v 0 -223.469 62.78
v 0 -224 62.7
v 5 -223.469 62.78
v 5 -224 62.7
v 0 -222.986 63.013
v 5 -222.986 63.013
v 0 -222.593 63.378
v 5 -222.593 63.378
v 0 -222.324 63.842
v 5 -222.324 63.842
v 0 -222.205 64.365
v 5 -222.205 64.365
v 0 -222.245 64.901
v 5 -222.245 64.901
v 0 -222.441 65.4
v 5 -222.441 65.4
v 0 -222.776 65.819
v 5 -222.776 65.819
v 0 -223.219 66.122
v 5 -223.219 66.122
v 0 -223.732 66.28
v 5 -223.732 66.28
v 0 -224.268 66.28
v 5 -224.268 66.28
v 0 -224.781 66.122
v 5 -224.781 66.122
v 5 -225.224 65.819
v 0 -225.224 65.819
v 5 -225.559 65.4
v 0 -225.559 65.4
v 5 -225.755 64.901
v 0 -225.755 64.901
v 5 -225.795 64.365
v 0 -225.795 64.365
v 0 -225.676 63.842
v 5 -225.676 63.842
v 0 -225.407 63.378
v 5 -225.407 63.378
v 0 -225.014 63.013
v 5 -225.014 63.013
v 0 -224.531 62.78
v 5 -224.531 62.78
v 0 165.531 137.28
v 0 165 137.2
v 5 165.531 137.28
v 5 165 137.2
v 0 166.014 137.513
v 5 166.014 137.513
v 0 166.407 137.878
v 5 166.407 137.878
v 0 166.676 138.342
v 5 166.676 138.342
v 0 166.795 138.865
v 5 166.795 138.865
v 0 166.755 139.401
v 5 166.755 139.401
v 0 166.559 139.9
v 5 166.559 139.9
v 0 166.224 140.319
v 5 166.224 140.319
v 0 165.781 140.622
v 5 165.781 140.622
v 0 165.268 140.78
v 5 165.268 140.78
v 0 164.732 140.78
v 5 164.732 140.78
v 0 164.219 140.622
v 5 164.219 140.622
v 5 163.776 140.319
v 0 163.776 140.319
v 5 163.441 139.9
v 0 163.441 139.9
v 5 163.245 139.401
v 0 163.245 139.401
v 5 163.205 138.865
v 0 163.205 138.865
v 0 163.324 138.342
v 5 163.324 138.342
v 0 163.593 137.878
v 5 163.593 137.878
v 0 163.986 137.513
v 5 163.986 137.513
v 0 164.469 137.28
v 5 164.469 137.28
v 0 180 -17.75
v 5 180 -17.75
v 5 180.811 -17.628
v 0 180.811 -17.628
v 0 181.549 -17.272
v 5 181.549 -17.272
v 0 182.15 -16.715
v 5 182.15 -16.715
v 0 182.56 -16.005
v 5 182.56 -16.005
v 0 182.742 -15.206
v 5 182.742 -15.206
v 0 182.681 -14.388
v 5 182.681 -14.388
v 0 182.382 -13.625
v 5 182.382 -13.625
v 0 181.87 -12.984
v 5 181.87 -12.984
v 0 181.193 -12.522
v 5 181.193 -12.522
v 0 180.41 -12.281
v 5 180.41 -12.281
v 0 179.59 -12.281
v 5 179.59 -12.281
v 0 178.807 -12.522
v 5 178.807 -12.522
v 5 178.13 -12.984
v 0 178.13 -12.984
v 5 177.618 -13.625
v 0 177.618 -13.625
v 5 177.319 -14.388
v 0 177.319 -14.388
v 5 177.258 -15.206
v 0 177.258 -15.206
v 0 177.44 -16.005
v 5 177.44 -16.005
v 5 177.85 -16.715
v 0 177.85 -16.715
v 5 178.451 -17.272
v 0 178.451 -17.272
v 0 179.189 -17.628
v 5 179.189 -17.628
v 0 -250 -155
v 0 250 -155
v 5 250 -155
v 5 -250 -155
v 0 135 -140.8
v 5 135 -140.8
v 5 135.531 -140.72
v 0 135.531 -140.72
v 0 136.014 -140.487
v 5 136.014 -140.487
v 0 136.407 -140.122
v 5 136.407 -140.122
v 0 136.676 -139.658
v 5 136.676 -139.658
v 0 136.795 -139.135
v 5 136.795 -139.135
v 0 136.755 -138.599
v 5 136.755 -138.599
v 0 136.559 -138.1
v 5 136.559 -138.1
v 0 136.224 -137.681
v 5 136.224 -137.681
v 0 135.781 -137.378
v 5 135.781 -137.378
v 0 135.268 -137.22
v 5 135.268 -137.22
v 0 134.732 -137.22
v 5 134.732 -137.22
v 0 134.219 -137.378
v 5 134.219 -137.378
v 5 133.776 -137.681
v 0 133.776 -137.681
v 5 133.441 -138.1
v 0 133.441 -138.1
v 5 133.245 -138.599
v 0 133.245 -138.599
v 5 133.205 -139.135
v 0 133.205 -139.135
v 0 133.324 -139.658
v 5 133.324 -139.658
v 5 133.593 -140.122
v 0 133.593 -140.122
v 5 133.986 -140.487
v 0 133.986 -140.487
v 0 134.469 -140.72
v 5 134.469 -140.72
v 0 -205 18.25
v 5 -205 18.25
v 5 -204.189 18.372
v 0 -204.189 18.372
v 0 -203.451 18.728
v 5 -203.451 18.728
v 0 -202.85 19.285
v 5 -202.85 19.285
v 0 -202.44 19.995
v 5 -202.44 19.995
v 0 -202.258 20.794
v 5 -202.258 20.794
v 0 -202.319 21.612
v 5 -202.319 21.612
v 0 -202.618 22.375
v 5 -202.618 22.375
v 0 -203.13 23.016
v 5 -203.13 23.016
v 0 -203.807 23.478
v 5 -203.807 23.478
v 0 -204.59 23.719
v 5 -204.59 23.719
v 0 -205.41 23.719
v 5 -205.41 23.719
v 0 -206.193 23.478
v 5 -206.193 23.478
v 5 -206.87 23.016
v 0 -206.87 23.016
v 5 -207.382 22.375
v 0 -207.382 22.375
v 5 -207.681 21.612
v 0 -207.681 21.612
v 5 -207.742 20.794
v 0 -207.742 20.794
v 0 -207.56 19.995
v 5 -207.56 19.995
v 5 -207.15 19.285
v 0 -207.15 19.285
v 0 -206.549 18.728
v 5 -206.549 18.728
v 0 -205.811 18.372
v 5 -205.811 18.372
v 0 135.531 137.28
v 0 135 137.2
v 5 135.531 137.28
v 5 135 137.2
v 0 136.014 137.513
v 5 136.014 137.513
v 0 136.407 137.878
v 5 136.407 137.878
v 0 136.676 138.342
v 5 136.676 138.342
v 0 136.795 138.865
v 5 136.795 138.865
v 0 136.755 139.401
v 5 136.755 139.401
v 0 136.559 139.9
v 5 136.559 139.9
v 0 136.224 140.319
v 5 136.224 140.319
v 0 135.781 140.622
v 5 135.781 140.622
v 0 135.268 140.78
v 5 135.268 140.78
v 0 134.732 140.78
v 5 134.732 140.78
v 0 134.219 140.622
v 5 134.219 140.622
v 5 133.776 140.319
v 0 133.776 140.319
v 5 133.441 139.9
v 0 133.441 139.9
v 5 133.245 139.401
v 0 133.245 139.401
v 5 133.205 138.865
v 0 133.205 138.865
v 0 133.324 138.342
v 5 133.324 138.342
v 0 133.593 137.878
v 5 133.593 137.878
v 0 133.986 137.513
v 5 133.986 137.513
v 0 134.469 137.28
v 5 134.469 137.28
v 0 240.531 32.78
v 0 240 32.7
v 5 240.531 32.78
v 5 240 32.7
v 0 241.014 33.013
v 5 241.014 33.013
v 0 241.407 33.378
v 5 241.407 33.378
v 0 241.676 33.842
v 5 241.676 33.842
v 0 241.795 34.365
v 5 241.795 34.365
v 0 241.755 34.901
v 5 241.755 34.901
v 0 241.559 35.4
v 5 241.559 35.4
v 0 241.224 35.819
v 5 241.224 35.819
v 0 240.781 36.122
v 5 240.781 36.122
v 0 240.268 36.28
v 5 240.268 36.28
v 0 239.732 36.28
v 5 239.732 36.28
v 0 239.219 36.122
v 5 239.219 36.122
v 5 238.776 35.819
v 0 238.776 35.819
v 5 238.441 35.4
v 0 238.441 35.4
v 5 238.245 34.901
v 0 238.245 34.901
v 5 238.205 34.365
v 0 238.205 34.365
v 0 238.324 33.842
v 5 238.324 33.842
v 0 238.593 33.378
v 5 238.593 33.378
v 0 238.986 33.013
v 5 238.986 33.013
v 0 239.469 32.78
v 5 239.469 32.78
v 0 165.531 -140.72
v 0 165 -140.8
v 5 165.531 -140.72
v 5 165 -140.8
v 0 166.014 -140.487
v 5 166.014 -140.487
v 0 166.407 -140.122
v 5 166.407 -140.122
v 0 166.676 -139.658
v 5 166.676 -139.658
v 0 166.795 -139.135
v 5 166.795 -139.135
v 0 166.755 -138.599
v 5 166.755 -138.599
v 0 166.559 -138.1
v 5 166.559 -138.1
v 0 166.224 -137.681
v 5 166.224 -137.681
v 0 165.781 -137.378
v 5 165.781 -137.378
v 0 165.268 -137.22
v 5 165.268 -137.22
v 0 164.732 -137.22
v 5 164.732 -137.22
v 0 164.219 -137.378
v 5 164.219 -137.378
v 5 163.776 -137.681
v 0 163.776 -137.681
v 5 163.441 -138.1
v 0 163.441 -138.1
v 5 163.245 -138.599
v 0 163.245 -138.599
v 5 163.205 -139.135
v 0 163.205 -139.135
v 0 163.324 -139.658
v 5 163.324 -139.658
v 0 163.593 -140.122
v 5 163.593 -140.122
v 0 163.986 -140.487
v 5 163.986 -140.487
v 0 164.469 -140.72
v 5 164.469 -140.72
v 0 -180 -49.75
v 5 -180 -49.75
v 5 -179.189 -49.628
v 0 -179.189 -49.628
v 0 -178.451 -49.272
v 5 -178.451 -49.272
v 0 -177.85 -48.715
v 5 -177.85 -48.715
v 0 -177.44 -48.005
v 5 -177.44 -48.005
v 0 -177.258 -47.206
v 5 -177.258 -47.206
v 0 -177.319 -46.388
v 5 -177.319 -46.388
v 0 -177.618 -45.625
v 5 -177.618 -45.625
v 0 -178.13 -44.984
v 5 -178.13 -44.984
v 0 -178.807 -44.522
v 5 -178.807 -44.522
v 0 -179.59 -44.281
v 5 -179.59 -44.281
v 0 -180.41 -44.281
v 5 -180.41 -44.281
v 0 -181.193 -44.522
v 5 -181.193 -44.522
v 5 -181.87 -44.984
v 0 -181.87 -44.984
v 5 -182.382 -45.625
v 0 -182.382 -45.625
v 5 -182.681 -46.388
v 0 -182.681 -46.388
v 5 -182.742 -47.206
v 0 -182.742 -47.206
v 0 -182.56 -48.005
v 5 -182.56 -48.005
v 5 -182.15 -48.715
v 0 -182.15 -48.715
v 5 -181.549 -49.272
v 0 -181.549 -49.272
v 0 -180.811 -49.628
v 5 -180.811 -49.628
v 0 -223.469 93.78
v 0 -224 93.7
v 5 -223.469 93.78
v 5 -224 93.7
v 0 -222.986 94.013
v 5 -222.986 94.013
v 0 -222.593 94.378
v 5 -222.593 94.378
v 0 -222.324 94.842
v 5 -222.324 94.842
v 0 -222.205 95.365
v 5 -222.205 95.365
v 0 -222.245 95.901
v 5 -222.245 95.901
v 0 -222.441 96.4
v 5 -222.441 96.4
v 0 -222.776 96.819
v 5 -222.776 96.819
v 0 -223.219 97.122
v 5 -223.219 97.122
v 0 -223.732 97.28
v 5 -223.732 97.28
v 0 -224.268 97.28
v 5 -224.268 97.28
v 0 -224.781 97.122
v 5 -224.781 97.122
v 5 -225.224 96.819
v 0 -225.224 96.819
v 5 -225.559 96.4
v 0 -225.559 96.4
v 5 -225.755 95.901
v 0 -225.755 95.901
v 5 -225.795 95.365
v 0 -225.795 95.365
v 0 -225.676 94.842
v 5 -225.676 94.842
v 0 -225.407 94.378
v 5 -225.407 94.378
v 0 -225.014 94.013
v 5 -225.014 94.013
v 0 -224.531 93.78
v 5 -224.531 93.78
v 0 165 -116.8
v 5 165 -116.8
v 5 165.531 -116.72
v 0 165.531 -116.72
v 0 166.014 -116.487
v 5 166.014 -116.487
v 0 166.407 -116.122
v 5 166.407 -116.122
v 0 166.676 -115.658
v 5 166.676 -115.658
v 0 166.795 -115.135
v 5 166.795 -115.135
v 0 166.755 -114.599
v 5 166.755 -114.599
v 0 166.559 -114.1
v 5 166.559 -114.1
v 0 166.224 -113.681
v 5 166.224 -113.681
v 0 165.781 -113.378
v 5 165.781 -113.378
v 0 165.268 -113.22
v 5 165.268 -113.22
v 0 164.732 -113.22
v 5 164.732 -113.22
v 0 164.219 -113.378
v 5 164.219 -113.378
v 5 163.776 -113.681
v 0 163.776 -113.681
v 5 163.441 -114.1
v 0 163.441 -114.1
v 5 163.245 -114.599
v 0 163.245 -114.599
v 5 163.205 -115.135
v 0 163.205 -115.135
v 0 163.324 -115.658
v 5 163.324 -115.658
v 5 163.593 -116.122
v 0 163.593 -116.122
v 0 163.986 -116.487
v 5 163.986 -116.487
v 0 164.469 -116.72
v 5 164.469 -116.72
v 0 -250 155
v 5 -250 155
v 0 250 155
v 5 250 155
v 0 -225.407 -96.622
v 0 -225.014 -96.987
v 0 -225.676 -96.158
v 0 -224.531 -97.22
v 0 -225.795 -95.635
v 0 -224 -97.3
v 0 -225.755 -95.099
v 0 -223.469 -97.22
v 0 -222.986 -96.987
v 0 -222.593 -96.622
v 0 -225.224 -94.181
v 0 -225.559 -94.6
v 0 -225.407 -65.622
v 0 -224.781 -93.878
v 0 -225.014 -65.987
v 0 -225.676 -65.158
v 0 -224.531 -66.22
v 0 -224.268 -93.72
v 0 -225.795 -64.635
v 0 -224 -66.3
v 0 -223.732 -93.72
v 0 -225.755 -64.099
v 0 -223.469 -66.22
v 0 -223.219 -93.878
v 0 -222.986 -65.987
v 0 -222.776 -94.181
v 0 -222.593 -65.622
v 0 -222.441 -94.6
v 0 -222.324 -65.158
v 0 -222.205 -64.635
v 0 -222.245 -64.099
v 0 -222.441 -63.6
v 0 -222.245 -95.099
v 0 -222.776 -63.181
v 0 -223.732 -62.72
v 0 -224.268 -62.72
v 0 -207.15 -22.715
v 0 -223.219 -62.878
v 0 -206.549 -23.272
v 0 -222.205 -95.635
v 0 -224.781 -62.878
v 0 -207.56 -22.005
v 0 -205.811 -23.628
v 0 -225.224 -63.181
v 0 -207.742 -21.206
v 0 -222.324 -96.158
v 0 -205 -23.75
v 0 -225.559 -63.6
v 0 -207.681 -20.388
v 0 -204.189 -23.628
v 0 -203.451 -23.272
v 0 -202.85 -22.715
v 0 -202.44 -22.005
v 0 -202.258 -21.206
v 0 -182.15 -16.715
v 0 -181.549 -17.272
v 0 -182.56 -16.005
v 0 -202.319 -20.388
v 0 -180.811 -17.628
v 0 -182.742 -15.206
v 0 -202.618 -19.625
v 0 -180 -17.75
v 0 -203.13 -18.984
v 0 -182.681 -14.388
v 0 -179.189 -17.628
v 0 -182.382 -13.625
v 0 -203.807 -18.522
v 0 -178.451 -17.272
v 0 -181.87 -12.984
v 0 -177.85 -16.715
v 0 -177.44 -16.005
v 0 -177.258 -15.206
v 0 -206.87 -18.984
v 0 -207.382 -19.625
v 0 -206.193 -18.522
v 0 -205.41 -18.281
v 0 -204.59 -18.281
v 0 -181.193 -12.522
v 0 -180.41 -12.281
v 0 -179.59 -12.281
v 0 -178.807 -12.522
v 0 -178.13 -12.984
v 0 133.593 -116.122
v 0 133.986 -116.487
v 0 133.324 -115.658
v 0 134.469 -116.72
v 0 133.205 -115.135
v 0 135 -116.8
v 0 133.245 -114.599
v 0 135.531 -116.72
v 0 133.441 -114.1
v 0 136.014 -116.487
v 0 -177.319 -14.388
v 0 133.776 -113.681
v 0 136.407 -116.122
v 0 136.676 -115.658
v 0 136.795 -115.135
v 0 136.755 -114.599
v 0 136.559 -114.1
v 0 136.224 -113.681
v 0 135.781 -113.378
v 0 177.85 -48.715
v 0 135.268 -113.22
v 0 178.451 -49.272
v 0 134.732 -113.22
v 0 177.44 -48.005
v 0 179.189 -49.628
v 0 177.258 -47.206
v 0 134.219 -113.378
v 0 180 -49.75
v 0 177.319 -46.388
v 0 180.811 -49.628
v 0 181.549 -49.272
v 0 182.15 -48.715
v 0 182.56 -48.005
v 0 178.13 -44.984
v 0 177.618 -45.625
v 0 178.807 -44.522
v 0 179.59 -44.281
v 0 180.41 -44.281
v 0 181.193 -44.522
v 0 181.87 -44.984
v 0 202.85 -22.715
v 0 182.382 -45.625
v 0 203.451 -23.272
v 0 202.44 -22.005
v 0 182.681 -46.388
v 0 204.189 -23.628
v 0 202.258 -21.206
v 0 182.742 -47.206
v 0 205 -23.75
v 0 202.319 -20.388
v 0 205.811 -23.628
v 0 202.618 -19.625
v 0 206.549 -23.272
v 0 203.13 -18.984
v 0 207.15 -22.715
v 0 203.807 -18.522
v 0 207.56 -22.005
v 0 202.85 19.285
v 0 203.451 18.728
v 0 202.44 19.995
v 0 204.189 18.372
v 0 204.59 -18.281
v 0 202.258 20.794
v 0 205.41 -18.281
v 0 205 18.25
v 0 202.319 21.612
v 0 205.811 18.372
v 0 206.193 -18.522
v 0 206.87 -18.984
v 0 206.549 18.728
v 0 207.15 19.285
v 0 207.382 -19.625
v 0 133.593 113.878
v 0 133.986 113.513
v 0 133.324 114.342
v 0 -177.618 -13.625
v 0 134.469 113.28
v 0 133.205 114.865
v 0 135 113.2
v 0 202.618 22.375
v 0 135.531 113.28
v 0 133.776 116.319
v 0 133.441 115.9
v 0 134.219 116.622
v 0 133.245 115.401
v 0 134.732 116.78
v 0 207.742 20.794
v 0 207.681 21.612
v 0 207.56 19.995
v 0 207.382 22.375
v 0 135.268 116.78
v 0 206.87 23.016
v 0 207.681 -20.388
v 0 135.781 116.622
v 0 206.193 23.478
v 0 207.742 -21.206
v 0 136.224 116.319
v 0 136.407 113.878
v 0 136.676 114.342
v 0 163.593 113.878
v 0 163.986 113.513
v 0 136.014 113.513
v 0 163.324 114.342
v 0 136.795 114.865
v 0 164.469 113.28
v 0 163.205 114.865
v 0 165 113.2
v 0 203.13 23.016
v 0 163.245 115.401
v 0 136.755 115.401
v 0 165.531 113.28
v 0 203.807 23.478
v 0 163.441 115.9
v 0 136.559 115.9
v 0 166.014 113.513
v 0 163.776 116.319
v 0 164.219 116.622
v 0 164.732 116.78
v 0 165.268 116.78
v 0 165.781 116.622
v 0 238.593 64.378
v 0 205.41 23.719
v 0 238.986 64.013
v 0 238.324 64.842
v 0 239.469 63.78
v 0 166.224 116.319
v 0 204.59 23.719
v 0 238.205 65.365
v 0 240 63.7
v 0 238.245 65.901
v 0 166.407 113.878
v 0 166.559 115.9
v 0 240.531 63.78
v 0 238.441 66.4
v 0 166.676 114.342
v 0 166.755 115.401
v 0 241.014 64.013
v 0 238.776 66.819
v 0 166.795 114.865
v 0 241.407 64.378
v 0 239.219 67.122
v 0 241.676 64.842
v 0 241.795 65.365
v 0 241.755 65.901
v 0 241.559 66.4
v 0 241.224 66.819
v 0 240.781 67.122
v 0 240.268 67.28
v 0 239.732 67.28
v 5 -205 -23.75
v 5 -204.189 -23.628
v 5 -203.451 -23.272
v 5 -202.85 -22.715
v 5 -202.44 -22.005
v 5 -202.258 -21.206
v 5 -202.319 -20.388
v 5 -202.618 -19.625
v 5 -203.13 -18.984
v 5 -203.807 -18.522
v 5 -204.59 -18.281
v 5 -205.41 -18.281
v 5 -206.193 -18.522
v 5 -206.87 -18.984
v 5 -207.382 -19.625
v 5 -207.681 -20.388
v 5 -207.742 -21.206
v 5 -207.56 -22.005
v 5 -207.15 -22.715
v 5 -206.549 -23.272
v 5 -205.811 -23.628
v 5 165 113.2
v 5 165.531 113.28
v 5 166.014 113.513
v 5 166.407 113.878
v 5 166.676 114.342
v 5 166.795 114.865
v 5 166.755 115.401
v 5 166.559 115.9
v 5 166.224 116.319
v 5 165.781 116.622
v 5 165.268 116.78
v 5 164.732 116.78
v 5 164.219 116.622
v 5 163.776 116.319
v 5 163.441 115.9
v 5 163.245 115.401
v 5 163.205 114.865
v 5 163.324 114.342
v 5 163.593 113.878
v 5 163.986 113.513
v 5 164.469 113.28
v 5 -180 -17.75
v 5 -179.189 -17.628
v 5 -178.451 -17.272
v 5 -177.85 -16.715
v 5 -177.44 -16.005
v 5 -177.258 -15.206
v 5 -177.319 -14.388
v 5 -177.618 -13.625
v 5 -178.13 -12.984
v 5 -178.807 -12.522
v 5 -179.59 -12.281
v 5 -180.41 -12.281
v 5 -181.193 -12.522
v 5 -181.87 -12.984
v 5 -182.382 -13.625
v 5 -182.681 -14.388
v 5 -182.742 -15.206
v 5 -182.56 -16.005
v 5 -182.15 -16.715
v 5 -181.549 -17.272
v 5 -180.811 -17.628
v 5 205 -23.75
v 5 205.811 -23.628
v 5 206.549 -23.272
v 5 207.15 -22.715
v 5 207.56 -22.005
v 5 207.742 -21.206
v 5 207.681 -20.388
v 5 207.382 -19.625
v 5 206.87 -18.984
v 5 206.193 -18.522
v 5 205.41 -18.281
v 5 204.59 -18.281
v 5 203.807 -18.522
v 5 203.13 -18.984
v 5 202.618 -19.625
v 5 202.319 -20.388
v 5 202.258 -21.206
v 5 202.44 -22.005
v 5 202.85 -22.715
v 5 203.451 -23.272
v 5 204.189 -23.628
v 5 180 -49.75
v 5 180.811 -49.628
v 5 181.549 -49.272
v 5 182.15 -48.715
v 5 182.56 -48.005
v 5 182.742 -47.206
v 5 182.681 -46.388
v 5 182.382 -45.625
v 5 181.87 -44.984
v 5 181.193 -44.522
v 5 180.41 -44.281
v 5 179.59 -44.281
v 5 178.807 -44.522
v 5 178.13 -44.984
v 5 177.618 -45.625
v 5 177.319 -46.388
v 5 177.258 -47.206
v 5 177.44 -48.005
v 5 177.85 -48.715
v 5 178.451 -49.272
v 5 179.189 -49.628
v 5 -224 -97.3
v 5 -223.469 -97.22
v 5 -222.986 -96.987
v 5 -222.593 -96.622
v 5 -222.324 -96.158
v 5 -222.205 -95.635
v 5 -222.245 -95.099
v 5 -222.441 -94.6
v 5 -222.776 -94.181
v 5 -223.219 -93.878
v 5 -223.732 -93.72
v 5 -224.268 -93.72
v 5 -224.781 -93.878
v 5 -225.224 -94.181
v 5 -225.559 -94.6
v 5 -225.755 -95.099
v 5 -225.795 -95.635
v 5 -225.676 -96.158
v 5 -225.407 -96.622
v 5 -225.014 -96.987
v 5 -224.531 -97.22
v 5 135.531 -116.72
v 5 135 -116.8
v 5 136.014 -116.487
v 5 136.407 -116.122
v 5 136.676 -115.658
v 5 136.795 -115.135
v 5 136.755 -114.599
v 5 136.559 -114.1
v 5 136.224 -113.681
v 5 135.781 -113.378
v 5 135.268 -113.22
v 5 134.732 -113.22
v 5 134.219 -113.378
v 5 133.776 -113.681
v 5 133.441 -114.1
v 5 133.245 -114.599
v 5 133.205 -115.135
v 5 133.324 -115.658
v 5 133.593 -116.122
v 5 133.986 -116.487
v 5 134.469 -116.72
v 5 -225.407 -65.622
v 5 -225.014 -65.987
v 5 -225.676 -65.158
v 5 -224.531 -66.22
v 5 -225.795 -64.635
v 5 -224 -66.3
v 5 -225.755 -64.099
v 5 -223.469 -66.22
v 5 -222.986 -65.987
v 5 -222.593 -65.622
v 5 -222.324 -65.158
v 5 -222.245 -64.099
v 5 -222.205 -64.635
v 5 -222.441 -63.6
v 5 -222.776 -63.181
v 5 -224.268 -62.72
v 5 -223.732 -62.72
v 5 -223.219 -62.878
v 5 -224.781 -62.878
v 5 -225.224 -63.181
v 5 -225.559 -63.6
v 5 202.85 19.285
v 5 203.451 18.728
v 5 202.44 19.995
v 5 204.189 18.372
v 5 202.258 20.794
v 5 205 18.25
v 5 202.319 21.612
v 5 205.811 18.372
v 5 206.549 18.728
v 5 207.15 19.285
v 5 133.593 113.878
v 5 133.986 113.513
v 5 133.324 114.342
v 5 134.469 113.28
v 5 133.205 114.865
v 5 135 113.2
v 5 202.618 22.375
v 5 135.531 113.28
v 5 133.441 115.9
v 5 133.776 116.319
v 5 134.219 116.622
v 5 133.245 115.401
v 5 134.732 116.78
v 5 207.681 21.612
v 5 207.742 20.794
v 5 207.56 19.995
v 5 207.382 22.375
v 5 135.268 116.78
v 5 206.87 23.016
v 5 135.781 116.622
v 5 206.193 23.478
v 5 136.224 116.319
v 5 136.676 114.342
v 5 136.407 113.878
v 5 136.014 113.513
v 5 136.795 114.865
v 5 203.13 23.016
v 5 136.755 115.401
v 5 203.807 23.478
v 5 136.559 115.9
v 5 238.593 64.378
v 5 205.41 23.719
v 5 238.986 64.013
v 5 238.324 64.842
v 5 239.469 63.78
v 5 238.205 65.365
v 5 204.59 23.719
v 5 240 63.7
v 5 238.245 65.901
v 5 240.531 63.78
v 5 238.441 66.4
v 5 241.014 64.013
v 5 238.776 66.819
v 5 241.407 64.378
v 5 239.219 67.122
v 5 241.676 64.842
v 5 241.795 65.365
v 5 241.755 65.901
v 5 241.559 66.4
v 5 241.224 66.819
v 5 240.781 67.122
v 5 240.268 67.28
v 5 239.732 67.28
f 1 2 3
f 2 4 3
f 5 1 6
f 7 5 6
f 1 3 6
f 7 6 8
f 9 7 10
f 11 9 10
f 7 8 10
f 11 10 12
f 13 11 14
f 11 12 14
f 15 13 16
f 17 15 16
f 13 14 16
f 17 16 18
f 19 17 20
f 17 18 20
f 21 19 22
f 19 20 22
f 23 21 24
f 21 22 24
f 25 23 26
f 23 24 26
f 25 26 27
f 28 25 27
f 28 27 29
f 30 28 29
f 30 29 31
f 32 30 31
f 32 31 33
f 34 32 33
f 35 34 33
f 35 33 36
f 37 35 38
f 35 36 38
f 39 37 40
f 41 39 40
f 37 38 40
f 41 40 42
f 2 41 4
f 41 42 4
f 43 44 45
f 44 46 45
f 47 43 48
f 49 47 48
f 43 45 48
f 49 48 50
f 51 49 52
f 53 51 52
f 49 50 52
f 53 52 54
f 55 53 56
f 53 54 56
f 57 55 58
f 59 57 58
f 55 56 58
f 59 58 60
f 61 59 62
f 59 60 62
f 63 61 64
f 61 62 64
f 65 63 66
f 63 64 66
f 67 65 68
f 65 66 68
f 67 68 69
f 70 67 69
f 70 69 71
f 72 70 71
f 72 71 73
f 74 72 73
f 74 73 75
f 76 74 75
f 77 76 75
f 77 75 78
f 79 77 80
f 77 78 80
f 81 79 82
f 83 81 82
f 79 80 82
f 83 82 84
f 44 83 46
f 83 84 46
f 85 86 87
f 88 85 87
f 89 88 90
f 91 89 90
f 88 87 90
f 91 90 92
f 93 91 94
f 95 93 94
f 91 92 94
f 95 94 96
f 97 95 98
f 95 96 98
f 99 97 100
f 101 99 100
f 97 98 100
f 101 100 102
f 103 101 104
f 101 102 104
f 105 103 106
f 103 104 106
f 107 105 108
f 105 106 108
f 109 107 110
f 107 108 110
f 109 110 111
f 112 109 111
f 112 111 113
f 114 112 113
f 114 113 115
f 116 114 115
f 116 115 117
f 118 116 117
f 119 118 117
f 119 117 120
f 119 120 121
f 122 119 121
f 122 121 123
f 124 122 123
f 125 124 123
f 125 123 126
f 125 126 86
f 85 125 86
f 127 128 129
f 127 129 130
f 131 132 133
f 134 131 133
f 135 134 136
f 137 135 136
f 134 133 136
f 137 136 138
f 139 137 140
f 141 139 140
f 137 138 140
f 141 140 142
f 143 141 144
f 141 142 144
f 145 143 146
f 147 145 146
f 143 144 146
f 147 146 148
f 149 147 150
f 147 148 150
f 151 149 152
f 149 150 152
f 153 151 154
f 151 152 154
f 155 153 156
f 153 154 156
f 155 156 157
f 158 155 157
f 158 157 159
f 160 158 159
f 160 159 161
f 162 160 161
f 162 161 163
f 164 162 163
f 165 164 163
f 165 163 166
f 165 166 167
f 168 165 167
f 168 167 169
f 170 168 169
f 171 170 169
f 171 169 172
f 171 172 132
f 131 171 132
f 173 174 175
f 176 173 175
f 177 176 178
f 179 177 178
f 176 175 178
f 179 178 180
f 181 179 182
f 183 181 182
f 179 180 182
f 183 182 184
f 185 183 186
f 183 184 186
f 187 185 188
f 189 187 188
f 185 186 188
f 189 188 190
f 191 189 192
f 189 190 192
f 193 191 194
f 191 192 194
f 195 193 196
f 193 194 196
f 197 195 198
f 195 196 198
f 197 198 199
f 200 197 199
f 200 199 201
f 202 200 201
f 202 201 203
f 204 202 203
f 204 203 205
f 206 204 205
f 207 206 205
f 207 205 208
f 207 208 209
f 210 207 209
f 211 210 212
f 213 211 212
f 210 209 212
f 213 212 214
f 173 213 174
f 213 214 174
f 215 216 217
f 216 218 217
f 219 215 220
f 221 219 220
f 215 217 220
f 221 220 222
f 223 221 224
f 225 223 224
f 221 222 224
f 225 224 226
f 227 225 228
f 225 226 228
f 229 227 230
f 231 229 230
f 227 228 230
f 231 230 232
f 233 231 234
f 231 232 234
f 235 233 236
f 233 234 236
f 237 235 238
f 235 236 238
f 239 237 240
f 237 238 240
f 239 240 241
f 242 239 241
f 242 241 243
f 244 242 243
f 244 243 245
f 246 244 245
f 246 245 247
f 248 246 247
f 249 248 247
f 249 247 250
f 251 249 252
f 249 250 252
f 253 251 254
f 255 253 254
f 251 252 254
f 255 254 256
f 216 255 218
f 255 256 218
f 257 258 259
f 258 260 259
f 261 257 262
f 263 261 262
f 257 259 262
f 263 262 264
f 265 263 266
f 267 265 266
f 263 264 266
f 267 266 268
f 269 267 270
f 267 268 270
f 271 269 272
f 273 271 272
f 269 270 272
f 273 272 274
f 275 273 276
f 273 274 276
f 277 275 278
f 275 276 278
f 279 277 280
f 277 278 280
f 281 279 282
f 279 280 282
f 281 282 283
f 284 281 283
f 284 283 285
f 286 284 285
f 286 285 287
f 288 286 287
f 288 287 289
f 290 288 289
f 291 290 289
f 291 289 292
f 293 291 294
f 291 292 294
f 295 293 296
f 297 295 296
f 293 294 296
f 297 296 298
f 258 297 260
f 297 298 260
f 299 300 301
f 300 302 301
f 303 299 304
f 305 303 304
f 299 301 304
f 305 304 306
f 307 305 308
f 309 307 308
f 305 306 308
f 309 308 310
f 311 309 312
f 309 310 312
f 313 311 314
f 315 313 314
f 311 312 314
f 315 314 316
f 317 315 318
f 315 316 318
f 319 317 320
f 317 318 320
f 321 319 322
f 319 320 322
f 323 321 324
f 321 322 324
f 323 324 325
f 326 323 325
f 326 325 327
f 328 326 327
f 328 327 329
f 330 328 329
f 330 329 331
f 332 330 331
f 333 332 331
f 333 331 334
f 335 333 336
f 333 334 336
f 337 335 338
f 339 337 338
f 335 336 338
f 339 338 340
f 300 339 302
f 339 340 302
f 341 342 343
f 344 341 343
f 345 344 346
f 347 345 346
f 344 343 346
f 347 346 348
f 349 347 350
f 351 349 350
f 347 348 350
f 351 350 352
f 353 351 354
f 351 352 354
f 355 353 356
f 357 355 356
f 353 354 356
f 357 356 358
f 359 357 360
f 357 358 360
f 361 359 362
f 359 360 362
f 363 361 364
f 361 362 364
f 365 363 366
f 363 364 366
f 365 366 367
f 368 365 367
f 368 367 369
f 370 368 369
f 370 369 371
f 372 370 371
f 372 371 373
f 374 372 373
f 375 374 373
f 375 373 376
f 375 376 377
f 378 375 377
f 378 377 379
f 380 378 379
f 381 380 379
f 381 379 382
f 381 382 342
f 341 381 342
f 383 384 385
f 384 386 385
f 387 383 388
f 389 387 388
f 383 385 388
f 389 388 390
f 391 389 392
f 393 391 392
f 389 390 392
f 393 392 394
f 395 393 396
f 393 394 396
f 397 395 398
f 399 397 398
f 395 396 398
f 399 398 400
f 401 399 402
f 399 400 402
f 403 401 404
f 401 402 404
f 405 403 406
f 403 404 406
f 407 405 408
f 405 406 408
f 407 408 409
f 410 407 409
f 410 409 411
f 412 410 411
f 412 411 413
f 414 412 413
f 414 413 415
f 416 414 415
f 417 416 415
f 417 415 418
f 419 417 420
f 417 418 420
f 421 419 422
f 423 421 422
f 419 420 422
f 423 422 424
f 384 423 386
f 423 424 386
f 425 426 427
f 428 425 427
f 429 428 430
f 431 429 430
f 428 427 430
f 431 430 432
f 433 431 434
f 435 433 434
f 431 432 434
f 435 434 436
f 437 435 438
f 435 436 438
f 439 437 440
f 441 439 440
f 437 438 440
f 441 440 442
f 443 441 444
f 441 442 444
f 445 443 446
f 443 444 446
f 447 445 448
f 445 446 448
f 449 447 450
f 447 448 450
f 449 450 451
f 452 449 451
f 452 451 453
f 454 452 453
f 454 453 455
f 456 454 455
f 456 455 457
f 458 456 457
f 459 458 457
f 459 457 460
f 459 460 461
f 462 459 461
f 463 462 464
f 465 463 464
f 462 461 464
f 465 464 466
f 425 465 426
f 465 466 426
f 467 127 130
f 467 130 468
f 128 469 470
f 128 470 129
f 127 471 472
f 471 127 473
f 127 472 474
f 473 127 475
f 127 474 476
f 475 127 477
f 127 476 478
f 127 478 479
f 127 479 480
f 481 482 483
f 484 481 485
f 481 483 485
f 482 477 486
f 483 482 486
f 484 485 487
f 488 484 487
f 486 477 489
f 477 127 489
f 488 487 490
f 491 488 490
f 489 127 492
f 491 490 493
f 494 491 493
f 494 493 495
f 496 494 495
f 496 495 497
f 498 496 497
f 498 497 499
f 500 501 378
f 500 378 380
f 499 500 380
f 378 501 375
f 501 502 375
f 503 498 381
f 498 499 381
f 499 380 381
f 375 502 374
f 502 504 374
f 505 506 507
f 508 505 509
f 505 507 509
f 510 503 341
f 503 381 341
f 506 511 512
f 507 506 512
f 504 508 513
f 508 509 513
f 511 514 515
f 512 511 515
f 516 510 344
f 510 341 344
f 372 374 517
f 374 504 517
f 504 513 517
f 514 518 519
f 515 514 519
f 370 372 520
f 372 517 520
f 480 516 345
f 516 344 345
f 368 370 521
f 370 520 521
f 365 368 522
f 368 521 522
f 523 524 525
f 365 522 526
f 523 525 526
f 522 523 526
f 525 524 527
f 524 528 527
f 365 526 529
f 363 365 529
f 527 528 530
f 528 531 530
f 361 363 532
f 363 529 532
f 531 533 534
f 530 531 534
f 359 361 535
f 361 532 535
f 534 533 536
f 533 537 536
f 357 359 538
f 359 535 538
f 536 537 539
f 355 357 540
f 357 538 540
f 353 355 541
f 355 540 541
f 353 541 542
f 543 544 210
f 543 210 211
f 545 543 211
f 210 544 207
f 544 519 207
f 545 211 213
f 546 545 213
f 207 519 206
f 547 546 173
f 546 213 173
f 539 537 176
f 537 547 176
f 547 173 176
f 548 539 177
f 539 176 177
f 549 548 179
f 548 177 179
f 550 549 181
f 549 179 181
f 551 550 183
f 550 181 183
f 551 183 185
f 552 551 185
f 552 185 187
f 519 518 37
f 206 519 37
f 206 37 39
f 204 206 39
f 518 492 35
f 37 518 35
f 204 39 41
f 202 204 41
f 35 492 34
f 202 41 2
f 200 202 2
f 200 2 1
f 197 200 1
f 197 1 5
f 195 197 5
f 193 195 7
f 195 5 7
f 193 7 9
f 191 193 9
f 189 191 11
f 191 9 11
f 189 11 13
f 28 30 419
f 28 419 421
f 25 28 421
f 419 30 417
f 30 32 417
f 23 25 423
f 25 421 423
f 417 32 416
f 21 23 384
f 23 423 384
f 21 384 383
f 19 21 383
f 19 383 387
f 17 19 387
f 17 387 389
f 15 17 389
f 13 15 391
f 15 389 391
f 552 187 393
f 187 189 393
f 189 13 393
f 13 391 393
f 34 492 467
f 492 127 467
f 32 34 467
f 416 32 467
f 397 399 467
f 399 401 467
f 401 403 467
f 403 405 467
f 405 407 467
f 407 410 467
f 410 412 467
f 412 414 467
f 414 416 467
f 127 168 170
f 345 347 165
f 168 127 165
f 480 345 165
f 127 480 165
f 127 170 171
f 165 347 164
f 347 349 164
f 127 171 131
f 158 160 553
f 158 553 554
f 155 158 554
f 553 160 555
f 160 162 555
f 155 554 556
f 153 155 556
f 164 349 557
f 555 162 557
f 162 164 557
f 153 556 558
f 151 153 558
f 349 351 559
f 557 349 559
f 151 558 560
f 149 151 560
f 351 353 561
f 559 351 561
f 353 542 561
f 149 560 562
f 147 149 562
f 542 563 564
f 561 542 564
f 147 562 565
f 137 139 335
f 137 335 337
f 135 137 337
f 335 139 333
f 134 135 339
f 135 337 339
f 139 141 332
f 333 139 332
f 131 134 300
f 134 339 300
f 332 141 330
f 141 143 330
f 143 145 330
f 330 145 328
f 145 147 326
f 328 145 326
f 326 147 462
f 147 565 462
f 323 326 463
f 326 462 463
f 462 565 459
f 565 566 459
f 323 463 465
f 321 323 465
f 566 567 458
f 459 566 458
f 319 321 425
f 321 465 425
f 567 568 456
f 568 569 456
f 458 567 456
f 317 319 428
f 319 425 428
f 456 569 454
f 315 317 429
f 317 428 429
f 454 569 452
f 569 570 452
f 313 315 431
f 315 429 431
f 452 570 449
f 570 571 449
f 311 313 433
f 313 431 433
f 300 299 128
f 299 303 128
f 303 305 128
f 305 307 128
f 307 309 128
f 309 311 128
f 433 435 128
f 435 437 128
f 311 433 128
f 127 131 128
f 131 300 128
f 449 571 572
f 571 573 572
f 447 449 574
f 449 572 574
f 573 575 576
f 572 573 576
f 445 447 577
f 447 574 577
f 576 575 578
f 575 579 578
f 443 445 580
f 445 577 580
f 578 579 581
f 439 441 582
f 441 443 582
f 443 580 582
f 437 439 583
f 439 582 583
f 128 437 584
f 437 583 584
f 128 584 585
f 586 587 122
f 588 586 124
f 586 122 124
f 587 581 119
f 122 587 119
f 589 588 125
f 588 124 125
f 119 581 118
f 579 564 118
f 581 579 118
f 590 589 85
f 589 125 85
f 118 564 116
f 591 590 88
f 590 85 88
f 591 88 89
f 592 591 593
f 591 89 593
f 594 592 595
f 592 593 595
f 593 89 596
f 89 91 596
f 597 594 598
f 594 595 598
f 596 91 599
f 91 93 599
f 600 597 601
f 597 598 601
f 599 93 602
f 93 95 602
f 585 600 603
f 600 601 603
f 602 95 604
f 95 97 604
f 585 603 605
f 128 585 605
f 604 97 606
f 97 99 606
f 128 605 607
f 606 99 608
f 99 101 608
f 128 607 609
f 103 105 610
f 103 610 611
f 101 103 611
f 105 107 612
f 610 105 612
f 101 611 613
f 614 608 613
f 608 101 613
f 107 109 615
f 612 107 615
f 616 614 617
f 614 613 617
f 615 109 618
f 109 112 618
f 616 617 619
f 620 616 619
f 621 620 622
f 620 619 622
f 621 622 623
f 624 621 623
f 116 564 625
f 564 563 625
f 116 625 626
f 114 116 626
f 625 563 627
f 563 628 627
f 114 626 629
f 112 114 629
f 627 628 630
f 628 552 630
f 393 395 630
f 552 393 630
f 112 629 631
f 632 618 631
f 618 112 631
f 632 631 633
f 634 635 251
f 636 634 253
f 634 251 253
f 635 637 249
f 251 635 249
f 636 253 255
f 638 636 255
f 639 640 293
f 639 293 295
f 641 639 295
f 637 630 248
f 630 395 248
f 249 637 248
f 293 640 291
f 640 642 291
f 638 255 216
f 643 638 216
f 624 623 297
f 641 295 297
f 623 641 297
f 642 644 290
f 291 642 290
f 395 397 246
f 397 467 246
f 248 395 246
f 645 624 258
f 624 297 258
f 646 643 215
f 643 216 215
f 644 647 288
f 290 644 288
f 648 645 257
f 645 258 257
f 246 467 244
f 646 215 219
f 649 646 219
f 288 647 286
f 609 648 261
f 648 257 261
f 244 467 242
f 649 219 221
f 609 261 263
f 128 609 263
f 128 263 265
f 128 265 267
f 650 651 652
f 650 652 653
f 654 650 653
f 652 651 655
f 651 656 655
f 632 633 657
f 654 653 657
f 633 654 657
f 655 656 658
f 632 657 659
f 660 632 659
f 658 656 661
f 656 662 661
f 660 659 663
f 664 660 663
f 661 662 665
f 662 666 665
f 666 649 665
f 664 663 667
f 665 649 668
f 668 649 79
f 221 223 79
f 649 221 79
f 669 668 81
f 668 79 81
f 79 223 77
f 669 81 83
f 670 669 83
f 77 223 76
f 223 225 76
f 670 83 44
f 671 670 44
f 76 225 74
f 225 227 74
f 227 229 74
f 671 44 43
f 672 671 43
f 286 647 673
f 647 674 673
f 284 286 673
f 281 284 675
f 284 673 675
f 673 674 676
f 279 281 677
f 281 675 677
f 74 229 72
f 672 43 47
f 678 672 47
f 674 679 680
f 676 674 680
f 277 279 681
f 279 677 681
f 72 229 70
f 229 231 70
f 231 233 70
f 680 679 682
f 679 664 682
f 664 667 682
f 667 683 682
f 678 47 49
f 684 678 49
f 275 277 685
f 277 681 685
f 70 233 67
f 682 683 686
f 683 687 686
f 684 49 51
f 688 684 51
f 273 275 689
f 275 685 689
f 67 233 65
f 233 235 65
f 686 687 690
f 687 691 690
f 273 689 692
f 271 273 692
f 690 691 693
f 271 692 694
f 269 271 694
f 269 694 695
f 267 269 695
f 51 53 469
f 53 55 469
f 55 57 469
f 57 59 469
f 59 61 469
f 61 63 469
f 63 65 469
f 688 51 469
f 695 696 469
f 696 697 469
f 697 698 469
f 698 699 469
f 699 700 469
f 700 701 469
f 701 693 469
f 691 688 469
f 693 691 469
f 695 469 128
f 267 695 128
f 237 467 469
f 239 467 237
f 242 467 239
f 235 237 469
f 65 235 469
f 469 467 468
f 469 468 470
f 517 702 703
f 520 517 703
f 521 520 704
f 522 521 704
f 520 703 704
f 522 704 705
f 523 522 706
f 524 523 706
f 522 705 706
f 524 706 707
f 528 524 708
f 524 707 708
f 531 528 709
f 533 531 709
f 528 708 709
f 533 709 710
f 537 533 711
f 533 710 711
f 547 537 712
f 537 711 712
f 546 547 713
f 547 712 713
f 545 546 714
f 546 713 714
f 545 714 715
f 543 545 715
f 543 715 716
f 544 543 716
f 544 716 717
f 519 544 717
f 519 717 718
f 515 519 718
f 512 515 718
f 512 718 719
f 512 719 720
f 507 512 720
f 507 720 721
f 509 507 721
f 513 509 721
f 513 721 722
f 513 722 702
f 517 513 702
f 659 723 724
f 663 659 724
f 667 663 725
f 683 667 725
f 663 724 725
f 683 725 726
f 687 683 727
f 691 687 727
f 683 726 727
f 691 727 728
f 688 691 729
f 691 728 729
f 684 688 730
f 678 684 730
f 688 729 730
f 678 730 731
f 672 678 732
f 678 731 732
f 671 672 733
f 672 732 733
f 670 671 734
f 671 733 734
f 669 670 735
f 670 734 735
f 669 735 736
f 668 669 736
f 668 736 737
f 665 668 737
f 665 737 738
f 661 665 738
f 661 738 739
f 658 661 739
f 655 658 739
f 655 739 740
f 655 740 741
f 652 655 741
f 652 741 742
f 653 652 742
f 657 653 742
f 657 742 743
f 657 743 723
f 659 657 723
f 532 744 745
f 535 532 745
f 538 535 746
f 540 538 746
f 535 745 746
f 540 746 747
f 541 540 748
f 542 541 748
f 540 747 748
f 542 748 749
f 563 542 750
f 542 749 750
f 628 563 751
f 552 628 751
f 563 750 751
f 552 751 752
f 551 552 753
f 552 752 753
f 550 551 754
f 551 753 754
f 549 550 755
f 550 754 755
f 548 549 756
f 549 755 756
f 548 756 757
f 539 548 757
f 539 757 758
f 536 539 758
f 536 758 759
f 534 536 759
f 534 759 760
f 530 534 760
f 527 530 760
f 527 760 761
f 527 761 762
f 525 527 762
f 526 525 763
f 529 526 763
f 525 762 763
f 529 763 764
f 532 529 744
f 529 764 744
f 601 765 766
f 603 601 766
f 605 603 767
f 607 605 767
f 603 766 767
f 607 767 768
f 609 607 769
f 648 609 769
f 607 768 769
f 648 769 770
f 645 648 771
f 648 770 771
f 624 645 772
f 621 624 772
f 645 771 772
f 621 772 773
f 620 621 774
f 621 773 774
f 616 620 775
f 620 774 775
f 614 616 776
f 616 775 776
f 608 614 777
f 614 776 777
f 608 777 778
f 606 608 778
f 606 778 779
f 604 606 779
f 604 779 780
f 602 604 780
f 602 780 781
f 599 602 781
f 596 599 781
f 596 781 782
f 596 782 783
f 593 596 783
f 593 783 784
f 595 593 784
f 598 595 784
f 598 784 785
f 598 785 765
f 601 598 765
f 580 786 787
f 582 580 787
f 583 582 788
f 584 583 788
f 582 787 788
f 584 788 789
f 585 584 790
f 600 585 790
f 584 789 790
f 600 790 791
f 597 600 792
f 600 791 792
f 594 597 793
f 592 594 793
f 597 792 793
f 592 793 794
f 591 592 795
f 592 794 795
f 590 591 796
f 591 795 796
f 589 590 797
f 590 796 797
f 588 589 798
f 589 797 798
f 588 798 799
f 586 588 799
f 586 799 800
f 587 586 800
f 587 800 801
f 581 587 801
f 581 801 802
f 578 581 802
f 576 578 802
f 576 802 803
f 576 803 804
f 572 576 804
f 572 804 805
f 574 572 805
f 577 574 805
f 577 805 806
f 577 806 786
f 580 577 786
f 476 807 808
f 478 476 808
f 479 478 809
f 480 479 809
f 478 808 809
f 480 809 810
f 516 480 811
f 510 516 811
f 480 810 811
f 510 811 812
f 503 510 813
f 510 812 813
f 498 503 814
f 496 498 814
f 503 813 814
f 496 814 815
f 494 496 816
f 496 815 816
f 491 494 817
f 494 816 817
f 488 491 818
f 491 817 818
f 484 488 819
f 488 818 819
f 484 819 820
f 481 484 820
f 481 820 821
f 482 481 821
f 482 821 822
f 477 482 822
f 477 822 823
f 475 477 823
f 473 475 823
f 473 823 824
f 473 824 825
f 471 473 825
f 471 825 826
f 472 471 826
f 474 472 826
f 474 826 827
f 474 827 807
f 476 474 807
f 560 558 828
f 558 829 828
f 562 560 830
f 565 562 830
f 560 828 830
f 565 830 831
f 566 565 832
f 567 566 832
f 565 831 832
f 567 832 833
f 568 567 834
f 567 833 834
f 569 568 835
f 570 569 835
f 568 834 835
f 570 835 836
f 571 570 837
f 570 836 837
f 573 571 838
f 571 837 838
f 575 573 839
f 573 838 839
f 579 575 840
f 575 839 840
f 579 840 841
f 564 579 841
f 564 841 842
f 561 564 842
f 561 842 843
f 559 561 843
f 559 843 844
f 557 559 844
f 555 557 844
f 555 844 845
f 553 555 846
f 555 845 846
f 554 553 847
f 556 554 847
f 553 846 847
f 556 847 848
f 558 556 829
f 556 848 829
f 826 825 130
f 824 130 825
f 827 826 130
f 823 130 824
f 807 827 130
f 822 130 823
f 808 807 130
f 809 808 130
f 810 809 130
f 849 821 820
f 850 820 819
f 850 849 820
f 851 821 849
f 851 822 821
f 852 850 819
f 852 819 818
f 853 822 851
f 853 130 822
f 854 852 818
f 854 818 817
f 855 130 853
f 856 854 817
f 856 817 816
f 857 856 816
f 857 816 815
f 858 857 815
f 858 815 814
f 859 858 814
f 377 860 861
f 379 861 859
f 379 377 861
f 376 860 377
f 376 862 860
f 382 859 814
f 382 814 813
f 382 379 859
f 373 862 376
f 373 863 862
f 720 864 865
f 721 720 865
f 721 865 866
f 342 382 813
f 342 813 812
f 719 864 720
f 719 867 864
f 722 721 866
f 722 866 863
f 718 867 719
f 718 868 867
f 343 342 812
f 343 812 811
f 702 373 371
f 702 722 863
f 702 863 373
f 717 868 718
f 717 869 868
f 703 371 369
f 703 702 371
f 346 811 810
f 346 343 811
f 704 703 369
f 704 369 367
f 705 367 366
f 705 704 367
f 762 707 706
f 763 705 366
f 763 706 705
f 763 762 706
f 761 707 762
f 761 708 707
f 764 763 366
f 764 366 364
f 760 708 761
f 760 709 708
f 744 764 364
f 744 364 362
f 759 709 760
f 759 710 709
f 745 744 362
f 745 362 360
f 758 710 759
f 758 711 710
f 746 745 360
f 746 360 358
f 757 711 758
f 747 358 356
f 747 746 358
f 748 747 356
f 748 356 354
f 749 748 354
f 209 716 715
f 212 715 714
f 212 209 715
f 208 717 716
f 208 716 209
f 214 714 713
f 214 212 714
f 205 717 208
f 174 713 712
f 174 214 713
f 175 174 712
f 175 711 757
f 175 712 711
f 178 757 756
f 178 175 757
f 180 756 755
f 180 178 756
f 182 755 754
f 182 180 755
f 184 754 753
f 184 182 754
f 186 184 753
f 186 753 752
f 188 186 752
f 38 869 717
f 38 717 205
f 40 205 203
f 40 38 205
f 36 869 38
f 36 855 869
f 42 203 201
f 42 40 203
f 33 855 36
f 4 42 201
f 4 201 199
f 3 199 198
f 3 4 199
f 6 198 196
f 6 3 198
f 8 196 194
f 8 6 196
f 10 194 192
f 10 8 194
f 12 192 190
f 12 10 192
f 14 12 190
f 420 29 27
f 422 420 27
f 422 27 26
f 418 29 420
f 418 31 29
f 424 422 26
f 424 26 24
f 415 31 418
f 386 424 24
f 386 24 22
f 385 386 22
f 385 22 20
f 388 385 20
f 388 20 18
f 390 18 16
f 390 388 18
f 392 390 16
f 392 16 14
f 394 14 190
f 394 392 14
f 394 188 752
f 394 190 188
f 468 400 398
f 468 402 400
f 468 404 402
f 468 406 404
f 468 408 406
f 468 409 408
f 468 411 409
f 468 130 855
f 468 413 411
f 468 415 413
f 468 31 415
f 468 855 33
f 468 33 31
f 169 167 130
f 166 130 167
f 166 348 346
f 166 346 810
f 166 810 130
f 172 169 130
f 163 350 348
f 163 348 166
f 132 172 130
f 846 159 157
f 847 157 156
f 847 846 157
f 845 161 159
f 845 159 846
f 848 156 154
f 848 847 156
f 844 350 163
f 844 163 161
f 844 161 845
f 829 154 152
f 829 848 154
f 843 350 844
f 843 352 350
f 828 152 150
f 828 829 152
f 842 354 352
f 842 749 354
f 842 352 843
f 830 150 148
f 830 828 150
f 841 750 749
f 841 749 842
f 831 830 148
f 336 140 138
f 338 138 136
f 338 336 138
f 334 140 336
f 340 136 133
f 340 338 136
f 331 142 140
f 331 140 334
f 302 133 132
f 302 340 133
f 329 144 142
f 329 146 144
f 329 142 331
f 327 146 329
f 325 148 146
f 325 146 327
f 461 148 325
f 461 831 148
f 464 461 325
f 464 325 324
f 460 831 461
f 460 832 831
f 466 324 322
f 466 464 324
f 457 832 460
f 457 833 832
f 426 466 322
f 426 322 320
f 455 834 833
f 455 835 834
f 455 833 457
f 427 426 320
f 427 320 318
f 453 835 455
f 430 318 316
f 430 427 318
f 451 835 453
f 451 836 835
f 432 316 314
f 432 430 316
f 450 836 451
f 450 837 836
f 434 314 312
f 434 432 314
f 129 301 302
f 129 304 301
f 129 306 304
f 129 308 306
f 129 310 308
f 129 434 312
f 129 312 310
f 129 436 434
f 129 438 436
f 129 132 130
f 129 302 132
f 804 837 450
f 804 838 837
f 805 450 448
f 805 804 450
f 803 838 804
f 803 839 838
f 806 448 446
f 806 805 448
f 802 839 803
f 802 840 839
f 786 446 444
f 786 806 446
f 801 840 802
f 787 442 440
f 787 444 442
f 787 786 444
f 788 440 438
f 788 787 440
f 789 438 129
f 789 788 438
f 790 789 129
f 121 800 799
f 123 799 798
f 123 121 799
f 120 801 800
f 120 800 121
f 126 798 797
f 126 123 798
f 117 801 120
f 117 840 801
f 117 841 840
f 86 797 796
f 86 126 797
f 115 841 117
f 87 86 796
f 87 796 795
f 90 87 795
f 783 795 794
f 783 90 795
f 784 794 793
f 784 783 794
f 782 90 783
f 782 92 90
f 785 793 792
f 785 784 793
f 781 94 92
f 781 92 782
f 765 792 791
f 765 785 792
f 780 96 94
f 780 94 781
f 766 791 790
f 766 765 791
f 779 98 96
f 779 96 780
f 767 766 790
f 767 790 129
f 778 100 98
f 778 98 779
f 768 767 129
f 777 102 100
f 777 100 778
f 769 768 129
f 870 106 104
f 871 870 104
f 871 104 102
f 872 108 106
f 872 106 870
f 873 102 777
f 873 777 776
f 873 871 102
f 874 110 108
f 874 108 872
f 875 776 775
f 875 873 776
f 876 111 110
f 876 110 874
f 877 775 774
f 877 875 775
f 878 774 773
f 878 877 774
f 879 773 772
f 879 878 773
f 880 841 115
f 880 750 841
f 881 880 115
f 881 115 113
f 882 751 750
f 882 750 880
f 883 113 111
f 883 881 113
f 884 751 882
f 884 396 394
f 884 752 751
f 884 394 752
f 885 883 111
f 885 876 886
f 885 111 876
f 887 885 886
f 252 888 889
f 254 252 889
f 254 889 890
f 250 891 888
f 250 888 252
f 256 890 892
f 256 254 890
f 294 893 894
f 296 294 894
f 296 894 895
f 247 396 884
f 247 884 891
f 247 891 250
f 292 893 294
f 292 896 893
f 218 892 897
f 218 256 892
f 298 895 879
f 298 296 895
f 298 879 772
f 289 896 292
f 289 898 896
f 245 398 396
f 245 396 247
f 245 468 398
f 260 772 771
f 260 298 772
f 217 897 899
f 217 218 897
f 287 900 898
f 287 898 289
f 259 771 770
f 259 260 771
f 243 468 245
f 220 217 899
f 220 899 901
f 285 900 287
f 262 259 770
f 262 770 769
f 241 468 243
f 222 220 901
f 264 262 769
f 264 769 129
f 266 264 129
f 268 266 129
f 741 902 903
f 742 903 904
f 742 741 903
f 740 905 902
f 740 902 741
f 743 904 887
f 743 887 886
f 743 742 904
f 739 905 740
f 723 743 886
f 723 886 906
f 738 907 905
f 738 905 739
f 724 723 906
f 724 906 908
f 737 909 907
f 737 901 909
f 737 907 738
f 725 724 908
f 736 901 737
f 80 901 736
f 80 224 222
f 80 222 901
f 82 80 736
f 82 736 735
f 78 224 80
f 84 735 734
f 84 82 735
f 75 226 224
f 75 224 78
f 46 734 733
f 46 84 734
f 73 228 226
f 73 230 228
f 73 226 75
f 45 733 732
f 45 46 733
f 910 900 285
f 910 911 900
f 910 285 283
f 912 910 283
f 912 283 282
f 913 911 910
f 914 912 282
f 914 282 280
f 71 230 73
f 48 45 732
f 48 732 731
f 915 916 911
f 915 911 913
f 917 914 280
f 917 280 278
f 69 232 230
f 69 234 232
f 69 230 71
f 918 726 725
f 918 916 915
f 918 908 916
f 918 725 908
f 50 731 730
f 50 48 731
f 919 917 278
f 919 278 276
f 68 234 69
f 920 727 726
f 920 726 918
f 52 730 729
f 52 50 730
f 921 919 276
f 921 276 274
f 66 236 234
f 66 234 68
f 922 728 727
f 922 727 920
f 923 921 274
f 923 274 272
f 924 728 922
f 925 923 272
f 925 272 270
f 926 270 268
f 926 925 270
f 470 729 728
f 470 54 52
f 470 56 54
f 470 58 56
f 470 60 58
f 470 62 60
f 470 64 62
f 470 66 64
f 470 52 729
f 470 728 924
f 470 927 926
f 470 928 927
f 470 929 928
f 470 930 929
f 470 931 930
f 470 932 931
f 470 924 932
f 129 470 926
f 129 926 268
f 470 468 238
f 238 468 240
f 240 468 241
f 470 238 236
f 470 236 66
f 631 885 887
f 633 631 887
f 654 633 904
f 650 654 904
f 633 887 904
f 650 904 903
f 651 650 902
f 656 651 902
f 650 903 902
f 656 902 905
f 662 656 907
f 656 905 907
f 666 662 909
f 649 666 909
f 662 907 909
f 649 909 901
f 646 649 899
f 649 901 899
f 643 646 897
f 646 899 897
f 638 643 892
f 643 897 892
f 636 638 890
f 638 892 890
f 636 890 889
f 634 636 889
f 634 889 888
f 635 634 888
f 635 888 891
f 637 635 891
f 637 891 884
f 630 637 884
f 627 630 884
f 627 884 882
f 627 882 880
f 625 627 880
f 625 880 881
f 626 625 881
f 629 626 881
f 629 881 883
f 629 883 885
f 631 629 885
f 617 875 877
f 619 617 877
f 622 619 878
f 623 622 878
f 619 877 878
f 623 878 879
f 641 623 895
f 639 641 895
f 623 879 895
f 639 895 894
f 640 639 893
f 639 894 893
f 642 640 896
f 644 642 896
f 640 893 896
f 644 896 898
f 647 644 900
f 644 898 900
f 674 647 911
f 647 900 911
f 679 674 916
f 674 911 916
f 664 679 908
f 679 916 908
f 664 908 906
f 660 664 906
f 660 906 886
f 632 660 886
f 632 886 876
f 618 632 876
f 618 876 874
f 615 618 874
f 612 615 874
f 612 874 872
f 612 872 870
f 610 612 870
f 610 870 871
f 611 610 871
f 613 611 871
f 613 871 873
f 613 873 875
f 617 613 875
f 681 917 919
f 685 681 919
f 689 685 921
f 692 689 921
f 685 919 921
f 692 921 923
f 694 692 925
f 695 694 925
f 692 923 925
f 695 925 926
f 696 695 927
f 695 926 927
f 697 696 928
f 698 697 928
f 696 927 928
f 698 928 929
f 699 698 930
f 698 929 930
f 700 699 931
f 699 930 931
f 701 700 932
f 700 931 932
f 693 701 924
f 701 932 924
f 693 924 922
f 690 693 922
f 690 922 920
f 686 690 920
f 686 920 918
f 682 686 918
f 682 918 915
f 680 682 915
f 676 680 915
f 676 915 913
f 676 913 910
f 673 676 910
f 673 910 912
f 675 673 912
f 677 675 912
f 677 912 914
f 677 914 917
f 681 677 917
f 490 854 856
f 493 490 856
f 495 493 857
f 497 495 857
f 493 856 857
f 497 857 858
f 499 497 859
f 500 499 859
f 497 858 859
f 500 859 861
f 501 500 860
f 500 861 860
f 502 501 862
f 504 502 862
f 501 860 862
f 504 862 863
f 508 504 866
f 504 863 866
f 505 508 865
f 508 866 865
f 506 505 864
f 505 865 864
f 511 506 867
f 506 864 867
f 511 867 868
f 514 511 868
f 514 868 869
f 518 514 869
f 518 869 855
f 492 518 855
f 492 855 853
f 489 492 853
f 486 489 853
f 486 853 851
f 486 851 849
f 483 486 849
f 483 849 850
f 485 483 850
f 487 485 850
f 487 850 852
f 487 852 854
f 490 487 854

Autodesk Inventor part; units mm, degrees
ref_plane "YZ Plane" through (0, 0, 0) normal (1, 0, 0) x (0, 1, 0)
ref_plane "XZ Plane" through (0, 0, 0) normal (0, 1, 0) x (-1, 0, 0)
ref_plane "XY Plane" through (0, 0, 0) normal (0, 0, 1) x (1, 0, 0)
sketch "草图1" plane through (0, 0, 0) normal (1, 0, 0) x (0, 1, 0)
  line L0 (250, -155) -> (-250, -155)
  line L1 (-250, -155) -> (-250, 155)
  line L2 (-250, 155) -> (250, 155)
  line L3 (250, 155) -> (250, -155)
  point P0 (0, 0)
  dimension "d0" = 500
  dimension "d1" = 310
extrude "拉伸1" add sketch "草图1" along normal blind 5
sketch "草图2" plane through (5, 0, 0) normal (1, 0, 0) x (0, 0, -1)
  circle A0 centre (95.5, -224) radius 1.8
  point P0 (0, 0)
  dimension "d4" = 3.6
extrude "拉伸2" cut sketch "草图2" against normal through all
sketch "草图3" plane through (5, 0, 0) normal (1, 0, 0) x (0, 0, -1)
  circle A0 centre (-95.5, -224) radius 1.8
  point P0 (0, 0)
  dimension "d7" = 3.6
extrude "拉伸3" cut sketch "草图3" against normal through all
sketch "草图4" plane through (5, 0, 0) normal (1, 0, 0) x (0, 0, -1)
  circle A0 centre (64.5, -224) radius 1.8
  point P0 (0, 0)
  dimension "d10" = 3.6
extrude "拉伸4" cut sketch "草图4" against normal through all
sketch "草图5" plane through (5, 0, 0) normal (1, 0, 0) x (0, 0, -1)
  circle A0 centre (-64.5, -224) radius 1.8
  point P0 (0, 0)
  dimension "d13" = 3.6
extrude "拉伸5" cut sketch "草图5" against normal through all
sketch "草图6" plane through (5, 0, 0) normal (1, 0, 0) x (0, 0, -1)
  circle A0 centre (21, -205) radius 2.75
  point P0 (0, 0)
  dimension "d16" = 5.5
extrude "拉伸6" cut sketch "草图6" against normal through all
sketch "草图7" plane through (5, 0, 0) normal (1, 0, 0) x (0, 0, -1)
  circle A0 centre (-21, -205) radius 2.75
  point P0 (0, 0)
  dimension "d19" = 5.5
extrude "拉伸7" cut sketch "草图7" against normal through all
sketch "草图8" plane through (5, 0, 0) normal (1, 0, 0) x (0, 0, -1)
  circle A0 centre (21, 205) radius 2.75
  point P0 (0, 0)
  dimension "d22" = 5.5
extrude "拉伸8" cut sketch "草图8" against normal through all
sketch "草图9" plane through (5, 0, 0) normal (1, 0, 0) x (0, 0, -1)
  circle A0 centre (-21, 205) radius 2.75
  point P0 (0, 0)
  dimension "d25" = 5.5
extrude "拉伸9" cut sketch "草图9" against normal through all
sketch "草图10" plane through (5, 0, 0) normal (1, 0, 0) x (0, 0, -1)
  circle A0 centre (15, 180) radius 2.75
  point P0 (0, 0)
  dimension "d28" = 5.5
extrude "拉伸10" cut sketch "草图10" against normal through all
sketch "草图11" plane through (5, 0, 0) normal (1, 0, 0) x (0, 0, -1)
  circle A0 centre (15, -180) radius 2.75
  point P0 (0, 0)
  dimension "d31" = 5.5
extrude "拉伸11" cut sketch "草图11" against normal through all
sketch "草图12" plane through (5, 0, 0) normal (1, 0, 0) x (0, 0, -1)
  circle A0 centre (47, 180) radius 2.75
  point P0 (0, 0)
  dimension "d34" = 5.5
extrude "拉伸12" cut sketch "草图12" against normal through all
sketch "草图13" plane through (5, 0, 0) normal (1, 0, 0) x (0, 0, -1)
  circle A0 centre (47, -180) radius 2.75
  point P0 (0, 0)
  dimension "d37" = 5.5
extrude "拉伸13" cut sketch "草图13" against normal through all
sketch "草图14" plane through (5, 0, 0) normal (1, 0, 0) x (0, 0, -1)
  circle A0 centre (139, 165) radius 1.8
  point P0 (0, 0)
  dimension "d40" = 3.6
extrude "拉伸14" cut sketch "草图14" against normal through all
sketch "草图15" plane through (5, 0, 0) normal (1, 0, 0) x (0, 0, -1)
  circle A0 centre (-139, 165) radius 1.8
  point P0 (0, 0)
  dimension "d43" = 3.6
extrude "拉伸15" cut sketch "草图15" against normal through all
sketch "草图16" plane through (5, 0, 0) normal (1, 0, 0) x (0, 0, -1)
  circle A0 centre (139, 135) radius 1.8
  point P0 (0, 0)
  dimension "d46" = 3.6
extrude "拉伸16" cut sketch "草图16" against normal through all
sketch "草图17" plane through (5, 0, 0) normal (1, 0, 0) x (0, 0, -1)
  circle A0 centre (-139, 135) radius 1.8
  point P0 (0, 0)
  dimension "d49" = 3.6
extrude "拉伸17" cut sketch "草图17" against normal through all
sketch "草图18" plane through (5, 0, 0) normal (1, 0, 0) x (0, 0, -1)
  circle A0 centre (115, 165) radius 1.8
  point P0 (0, 0)
  dimension "d52" = 3.6
extrude "拉伸18" cut sketch "草图18" against normal through all
sketch "草图19" plane through (5, 0, 0) normal (1, 0, 0) x (0, 0, -1)
  circle A0 centre (115, 135) radius 1.8
  point P0 (0, 0)
  dimension "d55" = 3.6
extrude "拉伸19" cut sketch "草图19" against normal through all
sketch "草图20" plane through (5, 0, 0) normal (1, 0, 0) x (0, 0, -1)
  circle A0 centre (-115, 135) radius 1.8
  point P0 (0, 0)
  dimension "d58" = 3.6
extrude "拉伸20" cut sketch "草图20" against normal through all
sketch "草图21" plane through (5, 0, 0) normal (1, 0, 0) x (0, 0, -1)
  circle A0 centre (-115, 165) radius 1.8
  point P0 (0, 0)
  dimension "d61" = 3.6
extrude "拉伸21" cut sketch "草图21" against normal through all
sketch "草图22" plane through (5, 0, 0) normal (1, 0, 0) x (0, 0, -1)
  circle A0 centre (-65.5, 240) radius 1.8
  point P0 (0, 0)
  dimension "d64" = 3.6
extrude "拉伸22" cut sketch "草图22" against normal through all
sketch "草图23" plane through (5, 0, 0) normal (1, 0, 0) x (0, 0, -1)
  circle A0 centre (-34.5, 240) radius 1.8
  point P0 (0, 0)
  dimension "d67" = 3.6
extrude "拉伸23" cut sketch "草图23" against normal through all
equation "\"折弯半径\" = 厚度"
equation "\"折弯释压宽度\" = 厚度"
equation "\"折弯释压深度\" = 0.5 * 厚度"
equation "\"拐角释压尺寸\" = 4 * 厚度"
equation "\"最小余量\" = 2 * 厚度"
equation "\"过渡半径\" = 折弯半径"
equation "\"Jacobi半径尺寸\" = 折弯半径"
equation "\"间隙大小\" = 厚度"
equation "\"厚度\" = 0.5"
properties part number "310mm板"
